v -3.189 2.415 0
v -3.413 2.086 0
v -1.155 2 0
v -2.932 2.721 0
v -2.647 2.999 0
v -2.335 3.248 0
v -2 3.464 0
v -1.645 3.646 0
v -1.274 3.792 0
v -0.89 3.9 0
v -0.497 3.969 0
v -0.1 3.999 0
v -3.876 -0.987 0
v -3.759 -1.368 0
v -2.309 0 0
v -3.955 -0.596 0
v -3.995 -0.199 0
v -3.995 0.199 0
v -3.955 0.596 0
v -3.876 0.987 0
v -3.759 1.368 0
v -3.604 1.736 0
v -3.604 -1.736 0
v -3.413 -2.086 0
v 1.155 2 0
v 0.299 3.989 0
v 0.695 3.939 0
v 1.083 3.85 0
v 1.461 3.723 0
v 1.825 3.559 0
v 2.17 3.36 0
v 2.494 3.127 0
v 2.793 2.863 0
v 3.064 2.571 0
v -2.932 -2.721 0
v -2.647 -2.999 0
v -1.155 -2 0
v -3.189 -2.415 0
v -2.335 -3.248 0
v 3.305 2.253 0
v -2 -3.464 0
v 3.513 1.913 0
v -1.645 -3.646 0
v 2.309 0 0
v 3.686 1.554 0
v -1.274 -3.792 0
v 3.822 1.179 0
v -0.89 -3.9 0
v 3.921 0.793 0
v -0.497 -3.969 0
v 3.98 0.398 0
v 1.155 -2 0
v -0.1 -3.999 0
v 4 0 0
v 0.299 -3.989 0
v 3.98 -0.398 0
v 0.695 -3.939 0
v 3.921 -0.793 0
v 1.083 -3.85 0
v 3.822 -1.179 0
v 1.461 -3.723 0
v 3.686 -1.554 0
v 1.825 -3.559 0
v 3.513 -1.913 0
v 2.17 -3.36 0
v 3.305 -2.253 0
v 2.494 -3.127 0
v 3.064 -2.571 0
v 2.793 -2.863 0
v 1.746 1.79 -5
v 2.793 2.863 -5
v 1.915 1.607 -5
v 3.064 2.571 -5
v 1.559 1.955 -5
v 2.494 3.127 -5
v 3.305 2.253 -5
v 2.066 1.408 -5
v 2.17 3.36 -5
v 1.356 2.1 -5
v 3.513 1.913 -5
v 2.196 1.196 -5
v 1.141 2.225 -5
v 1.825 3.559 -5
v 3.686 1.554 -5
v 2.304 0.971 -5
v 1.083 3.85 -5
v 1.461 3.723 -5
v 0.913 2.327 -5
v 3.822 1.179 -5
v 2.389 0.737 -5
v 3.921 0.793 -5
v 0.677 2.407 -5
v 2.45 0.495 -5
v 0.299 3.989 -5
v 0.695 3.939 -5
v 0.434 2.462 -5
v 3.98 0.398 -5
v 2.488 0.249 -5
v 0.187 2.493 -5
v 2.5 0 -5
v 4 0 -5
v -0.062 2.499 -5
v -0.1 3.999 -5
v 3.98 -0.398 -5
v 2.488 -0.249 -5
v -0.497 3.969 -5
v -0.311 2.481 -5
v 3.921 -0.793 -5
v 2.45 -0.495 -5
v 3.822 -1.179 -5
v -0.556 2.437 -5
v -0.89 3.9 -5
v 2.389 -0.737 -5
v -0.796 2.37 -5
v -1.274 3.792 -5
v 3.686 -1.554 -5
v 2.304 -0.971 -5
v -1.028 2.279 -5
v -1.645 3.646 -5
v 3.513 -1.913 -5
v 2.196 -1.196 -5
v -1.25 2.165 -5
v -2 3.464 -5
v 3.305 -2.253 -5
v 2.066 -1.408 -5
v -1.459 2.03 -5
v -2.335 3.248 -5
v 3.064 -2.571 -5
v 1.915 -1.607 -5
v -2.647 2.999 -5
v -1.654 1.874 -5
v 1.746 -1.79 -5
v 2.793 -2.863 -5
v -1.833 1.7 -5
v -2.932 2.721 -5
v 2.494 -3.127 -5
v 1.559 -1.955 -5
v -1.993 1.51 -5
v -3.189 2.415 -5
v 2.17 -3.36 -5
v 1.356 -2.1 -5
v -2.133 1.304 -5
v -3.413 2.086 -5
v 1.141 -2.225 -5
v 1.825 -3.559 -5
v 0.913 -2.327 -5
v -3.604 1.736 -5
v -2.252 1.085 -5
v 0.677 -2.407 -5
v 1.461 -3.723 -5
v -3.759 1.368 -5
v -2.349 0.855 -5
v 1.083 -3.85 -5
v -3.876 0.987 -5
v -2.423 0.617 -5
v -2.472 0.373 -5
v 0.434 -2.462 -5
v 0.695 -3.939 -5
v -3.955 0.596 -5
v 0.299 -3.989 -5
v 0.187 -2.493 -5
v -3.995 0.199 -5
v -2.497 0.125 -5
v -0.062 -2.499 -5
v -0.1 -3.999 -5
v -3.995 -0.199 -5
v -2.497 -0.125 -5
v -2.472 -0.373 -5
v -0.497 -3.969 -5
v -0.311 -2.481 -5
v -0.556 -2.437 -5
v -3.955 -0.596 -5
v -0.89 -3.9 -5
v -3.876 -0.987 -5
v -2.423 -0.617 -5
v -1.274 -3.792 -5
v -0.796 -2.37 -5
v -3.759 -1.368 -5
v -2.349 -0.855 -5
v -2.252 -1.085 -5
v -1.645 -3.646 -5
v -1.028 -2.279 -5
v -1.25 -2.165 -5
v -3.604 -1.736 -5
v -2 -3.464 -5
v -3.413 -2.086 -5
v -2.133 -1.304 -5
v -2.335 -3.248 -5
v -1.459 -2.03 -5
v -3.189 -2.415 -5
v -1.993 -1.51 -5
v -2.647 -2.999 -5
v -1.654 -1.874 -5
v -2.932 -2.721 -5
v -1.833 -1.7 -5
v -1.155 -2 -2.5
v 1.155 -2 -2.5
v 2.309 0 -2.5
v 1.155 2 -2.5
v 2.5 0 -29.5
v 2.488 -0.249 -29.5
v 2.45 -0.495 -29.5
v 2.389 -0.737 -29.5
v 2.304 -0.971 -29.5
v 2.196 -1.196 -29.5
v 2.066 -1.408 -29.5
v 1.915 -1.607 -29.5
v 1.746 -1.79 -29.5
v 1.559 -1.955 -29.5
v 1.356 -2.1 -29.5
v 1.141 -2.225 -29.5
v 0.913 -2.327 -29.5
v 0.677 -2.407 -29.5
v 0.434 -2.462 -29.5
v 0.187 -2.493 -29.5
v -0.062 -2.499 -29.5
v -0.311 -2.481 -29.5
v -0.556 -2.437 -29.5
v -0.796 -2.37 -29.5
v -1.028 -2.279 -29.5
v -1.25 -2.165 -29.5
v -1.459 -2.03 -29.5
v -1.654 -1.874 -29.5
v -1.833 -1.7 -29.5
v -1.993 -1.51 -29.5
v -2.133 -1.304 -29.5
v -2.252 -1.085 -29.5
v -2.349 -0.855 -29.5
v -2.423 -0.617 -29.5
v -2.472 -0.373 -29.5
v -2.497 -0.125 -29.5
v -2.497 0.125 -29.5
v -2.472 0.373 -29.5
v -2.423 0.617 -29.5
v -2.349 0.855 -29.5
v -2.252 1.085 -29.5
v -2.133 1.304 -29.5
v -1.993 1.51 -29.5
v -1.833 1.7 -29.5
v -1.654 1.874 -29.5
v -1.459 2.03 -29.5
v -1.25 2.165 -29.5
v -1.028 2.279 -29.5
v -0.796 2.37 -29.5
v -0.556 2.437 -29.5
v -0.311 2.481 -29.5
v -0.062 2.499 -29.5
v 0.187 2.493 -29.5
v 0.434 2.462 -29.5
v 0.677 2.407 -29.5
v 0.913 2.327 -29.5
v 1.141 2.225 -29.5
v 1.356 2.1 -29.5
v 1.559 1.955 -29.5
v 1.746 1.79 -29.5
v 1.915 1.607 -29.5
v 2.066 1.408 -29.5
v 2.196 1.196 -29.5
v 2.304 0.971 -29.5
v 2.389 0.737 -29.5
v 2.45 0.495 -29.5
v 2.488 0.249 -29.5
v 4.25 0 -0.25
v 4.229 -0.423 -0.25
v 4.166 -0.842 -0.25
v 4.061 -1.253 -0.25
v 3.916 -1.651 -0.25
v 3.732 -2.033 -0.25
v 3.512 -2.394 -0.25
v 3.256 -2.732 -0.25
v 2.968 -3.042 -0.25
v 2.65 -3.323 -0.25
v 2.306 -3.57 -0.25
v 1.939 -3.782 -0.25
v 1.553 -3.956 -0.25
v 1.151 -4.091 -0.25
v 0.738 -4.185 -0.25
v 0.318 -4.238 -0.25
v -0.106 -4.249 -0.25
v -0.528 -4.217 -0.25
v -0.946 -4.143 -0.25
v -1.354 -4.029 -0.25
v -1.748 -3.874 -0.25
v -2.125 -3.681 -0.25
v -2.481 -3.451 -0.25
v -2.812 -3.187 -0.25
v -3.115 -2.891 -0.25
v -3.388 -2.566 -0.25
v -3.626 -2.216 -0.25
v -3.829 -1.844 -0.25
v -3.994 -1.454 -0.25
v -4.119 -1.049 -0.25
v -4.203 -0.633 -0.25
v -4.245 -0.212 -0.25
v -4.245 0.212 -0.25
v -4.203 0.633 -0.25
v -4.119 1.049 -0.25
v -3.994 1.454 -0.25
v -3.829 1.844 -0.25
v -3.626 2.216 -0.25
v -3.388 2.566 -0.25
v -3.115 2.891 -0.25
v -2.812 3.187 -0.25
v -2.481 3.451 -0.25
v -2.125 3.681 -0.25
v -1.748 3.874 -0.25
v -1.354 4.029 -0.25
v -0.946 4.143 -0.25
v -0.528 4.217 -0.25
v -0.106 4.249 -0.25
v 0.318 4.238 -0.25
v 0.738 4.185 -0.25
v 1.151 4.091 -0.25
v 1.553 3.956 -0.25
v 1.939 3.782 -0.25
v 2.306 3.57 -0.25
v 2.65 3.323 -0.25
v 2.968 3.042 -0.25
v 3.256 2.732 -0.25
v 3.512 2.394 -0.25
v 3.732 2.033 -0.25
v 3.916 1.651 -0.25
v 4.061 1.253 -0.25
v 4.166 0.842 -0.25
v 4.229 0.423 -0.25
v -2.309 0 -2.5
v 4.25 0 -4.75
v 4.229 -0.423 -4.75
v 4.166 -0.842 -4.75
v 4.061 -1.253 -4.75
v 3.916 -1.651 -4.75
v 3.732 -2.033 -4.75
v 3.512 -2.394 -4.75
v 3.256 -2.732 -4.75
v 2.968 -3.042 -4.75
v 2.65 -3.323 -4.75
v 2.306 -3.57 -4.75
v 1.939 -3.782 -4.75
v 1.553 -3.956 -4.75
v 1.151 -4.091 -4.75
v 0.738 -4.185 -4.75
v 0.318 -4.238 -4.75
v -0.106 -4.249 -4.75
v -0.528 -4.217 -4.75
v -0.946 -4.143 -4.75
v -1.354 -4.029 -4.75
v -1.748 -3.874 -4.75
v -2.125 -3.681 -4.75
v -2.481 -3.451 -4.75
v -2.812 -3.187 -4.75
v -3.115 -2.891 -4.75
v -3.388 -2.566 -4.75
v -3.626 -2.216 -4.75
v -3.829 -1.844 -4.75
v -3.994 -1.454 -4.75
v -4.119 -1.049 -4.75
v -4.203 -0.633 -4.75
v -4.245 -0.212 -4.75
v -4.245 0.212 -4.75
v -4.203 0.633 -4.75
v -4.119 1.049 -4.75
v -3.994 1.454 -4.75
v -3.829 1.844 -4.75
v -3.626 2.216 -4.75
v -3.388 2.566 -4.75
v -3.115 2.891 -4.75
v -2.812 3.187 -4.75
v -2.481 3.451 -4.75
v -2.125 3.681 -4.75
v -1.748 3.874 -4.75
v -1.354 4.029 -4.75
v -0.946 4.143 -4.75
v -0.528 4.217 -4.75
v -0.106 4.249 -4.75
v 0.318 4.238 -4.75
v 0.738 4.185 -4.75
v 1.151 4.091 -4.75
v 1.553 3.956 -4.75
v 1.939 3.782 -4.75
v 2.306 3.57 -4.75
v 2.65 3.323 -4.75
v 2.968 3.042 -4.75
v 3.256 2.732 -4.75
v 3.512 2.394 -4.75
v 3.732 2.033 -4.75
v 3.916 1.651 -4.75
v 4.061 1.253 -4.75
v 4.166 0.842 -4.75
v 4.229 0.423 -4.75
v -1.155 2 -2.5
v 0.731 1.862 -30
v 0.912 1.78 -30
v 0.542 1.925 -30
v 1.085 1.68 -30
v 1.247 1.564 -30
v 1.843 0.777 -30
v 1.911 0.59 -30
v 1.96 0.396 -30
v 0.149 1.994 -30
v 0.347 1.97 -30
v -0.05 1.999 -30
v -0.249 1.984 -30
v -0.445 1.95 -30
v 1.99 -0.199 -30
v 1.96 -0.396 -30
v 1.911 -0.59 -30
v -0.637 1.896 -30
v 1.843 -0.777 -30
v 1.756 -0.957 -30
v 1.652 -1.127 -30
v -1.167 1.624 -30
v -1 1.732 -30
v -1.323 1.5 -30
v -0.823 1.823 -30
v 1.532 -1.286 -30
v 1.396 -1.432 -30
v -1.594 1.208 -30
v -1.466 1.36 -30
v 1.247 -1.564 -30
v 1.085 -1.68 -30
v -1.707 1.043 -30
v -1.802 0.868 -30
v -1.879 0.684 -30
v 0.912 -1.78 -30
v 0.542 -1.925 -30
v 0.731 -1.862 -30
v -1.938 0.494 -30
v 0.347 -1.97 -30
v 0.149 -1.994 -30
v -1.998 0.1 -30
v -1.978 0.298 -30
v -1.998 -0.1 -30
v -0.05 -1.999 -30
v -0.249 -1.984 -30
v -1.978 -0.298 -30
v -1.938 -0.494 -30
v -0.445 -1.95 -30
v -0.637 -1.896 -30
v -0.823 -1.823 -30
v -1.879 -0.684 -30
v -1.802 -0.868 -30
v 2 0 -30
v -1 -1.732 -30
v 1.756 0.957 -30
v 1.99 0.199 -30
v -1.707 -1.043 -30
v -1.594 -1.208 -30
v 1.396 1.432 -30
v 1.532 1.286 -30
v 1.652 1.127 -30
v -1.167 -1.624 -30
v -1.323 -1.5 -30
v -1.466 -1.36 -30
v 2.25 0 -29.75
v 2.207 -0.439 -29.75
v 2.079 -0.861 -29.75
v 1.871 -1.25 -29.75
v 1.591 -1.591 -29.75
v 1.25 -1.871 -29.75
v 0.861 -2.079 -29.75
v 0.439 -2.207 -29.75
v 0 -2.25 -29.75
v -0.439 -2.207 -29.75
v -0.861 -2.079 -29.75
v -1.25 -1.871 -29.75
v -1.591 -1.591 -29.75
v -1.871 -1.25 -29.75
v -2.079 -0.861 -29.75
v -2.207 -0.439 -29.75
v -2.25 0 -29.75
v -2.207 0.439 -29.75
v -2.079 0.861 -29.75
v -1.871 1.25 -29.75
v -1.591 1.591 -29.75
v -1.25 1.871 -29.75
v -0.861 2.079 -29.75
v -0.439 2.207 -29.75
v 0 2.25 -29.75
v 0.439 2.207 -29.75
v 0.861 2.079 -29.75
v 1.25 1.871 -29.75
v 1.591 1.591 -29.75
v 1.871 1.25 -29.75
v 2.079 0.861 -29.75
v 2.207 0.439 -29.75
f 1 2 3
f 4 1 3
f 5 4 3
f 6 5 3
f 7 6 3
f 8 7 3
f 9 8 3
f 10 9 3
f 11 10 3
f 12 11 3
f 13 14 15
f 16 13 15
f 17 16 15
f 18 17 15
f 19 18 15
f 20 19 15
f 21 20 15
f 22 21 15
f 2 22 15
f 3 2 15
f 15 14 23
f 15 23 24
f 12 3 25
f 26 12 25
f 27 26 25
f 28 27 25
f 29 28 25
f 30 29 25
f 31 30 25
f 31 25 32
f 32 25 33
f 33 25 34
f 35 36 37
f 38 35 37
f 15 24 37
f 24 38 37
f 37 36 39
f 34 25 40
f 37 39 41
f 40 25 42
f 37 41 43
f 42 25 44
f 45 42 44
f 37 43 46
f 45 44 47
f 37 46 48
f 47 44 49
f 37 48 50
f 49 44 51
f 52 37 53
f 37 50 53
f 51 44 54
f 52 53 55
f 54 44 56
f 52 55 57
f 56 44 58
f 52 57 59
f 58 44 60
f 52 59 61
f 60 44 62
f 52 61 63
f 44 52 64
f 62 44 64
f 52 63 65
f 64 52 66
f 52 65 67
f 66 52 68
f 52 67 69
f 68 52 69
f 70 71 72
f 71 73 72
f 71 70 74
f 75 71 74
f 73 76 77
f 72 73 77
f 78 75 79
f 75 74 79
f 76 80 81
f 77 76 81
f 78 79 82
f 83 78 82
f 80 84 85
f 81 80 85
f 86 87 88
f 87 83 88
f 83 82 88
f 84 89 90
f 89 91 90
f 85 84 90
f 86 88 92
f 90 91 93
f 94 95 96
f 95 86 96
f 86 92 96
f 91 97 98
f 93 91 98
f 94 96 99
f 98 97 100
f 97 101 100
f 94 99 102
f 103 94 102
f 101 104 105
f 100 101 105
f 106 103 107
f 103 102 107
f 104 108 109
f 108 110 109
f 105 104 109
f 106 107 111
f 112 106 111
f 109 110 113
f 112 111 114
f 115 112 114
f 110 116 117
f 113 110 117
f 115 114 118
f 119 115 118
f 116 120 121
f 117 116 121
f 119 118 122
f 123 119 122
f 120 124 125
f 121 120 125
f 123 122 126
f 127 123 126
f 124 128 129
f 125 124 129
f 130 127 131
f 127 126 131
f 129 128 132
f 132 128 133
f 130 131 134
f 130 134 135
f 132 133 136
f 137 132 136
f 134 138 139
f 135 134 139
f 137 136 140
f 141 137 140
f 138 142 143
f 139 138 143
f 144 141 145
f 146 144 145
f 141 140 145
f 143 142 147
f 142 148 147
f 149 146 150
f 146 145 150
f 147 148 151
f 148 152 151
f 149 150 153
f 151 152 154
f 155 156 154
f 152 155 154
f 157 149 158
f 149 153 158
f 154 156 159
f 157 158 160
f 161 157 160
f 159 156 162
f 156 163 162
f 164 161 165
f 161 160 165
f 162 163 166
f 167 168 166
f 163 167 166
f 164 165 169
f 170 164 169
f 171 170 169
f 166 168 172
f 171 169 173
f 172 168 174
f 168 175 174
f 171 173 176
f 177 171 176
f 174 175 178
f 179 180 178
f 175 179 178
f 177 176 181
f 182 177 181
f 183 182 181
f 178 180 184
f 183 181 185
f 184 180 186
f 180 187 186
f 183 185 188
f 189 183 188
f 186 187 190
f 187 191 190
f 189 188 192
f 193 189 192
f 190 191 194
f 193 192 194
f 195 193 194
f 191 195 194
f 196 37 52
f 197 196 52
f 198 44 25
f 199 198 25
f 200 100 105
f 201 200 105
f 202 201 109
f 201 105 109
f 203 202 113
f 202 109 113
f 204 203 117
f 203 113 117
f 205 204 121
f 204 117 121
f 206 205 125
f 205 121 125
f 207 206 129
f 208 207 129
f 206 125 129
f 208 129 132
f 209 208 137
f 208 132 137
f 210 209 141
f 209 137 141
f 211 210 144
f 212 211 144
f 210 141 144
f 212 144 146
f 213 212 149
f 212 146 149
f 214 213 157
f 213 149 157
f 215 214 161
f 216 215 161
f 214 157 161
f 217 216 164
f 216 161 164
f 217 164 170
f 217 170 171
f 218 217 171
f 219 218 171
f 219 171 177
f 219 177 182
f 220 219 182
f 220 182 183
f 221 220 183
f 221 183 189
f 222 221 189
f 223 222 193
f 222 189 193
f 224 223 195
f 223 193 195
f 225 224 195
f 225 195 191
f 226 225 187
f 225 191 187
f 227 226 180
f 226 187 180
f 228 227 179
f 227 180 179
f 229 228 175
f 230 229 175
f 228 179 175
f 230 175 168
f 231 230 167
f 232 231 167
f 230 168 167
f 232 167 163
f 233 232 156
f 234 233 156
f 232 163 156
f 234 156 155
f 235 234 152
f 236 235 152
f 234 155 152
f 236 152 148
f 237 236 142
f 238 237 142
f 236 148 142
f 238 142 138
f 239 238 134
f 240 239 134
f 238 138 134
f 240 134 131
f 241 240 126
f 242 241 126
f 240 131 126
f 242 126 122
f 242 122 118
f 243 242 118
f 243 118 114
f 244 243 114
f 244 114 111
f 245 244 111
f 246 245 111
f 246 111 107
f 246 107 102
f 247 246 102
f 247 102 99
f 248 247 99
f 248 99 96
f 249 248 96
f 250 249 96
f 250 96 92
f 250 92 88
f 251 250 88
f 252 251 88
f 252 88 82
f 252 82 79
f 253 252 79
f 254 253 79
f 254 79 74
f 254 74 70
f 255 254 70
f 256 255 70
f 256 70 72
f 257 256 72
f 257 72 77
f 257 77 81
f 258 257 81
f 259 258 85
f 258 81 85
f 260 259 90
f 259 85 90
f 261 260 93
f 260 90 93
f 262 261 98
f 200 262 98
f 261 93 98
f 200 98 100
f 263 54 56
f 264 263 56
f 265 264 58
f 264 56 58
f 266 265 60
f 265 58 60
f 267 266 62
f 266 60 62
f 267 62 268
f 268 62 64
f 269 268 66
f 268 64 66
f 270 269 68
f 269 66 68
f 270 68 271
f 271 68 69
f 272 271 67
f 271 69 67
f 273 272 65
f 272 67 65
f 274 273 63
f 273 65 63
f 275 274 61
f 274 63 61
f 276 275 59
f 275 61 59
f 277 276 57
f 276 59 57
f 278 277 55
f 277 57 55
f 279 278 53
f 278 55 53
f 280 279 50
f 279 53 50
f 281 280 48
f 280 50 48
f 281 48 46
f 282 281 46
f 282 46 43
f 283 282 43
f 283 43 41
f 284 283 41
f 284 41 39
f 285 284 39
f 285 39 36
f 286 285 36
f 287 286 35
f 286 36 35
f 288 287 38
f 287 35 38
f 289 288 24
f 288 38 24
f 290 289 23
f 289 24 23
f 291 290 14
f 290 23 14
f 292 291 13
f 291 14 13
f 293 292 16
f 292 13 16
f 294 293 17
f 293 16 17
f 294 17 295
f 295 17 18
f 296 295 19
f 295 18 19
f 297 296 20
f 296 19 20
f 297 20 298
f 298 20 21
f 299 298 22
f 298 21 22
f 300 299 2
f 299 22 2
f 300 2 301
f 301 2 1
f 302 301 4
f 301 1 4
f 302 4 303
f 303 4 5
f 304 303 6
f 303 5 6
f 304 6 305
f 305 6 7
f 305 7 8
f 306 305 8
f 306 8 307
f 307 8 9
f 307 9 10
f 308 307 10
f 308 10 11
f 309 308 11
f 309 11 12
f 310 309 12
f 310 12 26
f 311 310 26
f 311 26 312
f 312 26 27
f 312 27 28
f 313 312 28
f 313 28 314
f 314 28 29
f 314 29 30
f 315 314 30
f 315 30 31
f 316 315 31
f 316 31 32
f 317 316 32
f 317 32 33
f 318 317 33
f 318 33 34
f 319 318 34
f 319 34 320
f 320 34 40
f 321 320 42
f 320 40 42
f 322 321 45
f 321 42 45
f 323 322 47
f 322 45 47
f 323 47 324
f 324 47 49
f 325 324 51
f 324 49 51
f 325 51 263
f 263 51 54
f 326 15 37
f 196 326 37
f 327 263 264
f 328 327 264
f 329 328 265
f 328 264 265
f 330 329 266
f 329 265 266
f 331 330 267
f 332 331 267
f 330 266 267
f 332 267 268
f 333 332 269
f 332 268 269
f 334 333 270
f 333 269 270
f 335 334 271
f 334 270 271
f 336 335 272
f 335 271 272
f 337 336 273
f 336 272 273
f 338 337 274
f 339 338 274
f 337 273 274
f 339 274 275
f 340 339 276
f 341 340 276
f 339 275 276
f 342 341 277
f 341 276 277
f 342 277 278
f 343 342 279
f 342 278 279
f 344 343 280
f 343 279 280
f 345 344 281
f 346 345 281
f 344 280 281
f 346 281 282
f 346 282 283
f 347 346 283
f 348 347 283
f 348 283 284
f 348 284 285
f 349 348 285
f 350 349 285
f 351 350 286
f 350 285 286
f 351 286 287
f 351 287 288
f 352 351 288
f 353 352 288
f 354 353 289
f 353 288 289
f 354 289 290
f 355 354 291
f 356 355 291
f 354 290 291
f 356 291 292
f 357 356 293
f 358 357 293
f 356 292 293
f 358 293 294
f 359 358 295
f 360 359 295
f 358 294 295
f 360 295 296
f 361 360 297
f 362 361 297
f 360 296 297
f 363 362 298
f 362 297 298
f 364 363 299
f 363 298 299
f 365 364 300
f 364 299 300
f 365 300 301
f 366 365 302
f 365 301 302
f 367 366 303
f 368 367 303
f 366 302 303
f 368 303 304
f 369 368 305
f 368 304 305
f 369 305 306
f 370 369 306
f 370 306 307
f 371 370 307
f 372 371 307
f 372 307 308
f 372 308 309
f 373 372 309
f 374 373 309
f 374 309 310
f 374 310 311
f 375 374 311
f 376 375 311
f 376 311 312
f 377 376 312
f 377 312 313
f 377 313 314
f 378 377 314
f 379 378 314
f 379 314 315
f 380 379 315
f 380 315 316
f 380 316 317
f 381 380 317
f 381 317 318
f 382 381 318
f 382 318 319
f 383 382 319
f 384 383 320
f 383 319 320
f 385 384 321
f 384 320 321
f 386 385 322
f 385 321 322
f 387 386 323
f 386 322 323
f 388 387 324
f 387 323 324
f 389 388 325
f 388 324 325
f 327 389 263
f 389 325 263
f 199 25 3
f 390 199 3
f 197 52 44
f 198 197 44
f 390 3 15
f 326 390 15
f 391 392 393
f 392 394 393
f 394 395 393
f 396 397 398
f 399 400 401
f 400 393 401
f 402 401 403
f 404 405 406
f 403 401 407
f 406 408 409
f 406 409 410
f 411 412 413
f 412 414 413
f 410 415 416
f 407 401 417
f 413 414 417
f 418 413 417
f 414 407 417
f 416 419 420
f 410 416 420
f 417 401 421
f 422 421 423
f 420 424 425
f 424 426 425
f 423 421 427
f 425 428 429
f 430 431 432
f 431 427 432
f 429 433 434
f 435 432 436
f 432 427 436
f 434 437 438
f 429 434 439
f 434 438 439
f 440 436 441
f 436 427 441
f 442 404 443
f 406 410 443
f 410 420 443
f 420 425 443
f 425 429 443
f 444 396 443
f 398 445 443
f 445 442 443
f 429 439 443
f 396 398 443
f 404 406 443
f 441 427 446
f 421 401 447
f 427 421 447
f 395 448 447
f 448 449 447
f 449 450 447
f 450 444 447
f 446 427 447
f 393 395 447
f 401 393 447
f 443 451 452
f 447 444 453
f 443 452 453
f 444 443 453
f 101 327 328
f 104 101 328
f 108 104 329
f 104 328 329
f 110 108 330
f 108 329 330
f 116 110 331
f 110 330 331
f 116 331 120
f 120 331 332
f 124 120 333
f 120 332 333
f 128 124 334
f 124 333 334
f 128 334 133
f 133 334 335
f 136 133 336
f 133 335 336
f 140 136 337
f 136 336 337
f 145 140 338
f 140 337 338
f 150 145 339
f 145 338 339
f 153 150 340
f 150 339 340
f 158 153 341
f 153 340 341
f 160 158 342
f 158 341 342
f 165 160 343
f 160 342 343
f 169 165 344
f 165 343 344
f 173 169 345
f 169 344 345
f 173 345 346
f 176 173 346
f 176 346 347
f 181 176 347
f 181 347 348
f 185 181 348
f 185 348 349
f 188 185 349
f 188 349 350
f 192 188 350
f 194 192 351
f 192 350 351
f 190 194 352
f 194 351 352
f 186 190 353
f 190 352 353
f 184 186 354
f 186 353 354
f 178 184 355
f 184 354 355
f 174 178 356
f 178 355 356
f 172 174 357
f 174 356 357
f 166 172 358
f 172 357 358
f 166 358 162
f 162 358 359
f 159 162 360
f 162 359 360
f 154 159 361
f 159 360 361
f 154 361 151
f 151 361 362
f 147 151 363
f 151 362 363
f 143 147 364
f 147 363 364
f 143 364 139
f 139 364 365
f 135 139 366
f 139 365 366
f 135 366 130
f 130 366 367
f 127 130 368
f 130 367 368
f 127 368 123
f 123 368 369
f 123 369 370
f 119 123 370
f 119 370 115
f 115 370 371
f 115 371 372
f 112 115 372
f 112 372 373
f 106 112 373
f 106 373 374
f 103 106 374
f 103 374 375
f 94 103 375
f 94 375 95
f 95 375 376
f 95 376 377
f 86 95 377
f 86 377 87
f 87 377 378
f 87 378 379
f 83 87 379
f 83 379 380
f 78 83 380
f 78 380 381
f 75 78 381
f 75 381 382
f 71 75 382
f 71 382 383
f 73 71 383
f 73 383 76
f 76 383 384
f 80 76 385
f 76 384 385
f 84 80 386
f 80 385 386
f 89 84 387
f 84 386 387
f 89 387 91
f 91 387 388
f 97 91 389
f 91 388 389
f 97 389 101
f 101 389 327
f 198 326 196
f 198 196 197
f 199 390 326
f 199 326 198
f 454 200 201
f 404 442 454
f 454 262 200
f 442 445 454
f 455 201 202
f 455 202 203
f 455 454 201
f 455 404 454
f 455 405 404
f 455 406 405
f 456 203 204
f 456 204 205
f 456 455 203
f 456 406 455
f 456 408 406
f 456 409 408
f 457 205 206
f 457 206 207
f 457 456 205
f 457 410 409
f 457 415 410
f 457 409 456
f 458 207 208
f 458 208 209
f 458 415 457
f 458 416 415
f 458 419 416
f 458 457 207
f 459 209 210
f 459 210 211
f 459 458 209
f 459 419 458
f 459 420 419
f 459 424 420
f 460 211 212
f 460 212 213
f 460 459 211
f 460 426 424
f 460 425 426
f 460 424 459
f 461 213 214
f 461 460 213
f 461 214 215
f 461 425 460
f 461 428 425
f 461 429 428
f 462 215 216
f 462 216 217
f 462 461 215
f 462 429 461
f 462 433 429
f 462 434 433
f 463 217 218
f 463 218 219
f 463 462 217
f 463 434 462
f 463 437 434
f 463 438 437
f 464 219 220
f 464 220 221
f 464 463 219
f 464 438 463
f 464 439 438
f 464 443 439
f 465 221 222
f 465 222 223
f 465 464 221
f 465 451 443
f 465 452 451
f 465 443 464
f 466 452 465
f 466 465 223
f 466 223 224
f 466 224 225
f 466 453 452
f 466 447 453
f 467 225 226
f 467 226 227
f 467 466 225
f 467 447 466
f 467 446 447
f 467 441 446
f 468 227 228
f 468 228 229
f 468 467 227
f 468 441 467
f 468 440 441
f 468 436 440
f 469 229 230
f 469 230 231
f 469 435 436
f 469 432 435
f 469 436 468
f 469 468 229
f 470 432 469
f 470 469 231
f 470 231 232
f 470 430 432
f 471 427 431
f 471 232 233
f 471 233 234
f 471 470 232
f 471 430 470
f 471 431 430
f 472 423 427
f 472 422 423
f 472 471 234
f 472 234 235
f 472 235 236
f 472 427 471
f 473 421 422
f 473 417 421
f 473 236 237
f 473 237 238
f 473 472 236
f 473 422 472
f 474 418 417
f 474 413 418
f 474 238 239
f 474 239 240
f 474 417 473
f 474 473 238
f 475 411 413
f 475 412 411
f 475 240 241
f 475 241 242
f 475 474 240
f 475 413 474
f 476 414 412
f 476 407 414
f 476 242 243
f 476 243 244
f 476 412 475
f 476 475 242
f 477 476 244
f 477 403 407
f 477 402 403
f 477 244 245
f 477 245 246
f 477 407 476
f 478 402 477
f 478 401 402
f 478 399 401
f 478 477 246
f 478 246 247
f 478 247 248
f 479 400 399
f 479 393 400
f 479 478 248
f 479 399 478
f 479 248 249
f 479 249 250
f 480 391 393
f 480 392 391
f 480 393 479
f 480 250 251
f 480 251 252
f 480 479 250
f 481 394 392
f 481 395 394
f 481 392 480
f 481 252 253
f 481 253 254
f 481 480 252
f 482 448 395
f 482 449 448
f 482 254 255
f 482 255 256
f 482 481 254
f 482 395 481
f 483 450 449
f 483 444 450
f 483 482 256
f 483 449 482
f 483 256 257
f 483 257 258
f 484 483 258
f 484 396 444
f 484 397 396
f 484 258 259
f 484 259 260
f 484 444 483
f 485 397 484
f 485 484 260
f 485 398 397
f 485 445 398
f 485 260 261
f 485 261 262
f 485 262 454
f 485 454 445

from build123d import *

# Parameters (mm, degrees)
F3_DEPTH = 2.5
F4_SIZE  = 0.5
F5_SIZE  = 0.25


with BuildPart() as f1:
    # F0 (on Front) → F1 (revolve)
    with BuildSketch(Plane.XZ):
        Polygon((4.25, 0), (0, 0), (0, -30), (2.5, -30), (2.5, -5), (4.25, -5), align=None)
    revolve(axis=Axis((0, 0, -15), (0, 0, -1)))

    # F2 (on face) → F3 (cut)
    with BuildSketch(Plane.XY):
        Polygon((1.154701, 2), (-1.154701, 2), (-2.309401, 0), (-1.154701, -2), (1.154701, -2), (2.309401, 0), align=None)
    extrude(amount=-F3_DEPTH, mode=Mode.SUBTRACT)

    # F4
    f4_edges = [f1.edges().sort_by_distance(p)[0] for p in [
        (-2.5, 0, -30),
    ]]
    chamfer(f4_edges, length=F4_SIZE)

    # F5
    f5_edges = [f1.edges().sort_by_distance(p)[0] for p in [
        (-4.25, 0, 0),
        (-4.25, 0, -5),
    ]]
    chamfer(f5_edges, length=F5_SIZE)


solid = f1.part
